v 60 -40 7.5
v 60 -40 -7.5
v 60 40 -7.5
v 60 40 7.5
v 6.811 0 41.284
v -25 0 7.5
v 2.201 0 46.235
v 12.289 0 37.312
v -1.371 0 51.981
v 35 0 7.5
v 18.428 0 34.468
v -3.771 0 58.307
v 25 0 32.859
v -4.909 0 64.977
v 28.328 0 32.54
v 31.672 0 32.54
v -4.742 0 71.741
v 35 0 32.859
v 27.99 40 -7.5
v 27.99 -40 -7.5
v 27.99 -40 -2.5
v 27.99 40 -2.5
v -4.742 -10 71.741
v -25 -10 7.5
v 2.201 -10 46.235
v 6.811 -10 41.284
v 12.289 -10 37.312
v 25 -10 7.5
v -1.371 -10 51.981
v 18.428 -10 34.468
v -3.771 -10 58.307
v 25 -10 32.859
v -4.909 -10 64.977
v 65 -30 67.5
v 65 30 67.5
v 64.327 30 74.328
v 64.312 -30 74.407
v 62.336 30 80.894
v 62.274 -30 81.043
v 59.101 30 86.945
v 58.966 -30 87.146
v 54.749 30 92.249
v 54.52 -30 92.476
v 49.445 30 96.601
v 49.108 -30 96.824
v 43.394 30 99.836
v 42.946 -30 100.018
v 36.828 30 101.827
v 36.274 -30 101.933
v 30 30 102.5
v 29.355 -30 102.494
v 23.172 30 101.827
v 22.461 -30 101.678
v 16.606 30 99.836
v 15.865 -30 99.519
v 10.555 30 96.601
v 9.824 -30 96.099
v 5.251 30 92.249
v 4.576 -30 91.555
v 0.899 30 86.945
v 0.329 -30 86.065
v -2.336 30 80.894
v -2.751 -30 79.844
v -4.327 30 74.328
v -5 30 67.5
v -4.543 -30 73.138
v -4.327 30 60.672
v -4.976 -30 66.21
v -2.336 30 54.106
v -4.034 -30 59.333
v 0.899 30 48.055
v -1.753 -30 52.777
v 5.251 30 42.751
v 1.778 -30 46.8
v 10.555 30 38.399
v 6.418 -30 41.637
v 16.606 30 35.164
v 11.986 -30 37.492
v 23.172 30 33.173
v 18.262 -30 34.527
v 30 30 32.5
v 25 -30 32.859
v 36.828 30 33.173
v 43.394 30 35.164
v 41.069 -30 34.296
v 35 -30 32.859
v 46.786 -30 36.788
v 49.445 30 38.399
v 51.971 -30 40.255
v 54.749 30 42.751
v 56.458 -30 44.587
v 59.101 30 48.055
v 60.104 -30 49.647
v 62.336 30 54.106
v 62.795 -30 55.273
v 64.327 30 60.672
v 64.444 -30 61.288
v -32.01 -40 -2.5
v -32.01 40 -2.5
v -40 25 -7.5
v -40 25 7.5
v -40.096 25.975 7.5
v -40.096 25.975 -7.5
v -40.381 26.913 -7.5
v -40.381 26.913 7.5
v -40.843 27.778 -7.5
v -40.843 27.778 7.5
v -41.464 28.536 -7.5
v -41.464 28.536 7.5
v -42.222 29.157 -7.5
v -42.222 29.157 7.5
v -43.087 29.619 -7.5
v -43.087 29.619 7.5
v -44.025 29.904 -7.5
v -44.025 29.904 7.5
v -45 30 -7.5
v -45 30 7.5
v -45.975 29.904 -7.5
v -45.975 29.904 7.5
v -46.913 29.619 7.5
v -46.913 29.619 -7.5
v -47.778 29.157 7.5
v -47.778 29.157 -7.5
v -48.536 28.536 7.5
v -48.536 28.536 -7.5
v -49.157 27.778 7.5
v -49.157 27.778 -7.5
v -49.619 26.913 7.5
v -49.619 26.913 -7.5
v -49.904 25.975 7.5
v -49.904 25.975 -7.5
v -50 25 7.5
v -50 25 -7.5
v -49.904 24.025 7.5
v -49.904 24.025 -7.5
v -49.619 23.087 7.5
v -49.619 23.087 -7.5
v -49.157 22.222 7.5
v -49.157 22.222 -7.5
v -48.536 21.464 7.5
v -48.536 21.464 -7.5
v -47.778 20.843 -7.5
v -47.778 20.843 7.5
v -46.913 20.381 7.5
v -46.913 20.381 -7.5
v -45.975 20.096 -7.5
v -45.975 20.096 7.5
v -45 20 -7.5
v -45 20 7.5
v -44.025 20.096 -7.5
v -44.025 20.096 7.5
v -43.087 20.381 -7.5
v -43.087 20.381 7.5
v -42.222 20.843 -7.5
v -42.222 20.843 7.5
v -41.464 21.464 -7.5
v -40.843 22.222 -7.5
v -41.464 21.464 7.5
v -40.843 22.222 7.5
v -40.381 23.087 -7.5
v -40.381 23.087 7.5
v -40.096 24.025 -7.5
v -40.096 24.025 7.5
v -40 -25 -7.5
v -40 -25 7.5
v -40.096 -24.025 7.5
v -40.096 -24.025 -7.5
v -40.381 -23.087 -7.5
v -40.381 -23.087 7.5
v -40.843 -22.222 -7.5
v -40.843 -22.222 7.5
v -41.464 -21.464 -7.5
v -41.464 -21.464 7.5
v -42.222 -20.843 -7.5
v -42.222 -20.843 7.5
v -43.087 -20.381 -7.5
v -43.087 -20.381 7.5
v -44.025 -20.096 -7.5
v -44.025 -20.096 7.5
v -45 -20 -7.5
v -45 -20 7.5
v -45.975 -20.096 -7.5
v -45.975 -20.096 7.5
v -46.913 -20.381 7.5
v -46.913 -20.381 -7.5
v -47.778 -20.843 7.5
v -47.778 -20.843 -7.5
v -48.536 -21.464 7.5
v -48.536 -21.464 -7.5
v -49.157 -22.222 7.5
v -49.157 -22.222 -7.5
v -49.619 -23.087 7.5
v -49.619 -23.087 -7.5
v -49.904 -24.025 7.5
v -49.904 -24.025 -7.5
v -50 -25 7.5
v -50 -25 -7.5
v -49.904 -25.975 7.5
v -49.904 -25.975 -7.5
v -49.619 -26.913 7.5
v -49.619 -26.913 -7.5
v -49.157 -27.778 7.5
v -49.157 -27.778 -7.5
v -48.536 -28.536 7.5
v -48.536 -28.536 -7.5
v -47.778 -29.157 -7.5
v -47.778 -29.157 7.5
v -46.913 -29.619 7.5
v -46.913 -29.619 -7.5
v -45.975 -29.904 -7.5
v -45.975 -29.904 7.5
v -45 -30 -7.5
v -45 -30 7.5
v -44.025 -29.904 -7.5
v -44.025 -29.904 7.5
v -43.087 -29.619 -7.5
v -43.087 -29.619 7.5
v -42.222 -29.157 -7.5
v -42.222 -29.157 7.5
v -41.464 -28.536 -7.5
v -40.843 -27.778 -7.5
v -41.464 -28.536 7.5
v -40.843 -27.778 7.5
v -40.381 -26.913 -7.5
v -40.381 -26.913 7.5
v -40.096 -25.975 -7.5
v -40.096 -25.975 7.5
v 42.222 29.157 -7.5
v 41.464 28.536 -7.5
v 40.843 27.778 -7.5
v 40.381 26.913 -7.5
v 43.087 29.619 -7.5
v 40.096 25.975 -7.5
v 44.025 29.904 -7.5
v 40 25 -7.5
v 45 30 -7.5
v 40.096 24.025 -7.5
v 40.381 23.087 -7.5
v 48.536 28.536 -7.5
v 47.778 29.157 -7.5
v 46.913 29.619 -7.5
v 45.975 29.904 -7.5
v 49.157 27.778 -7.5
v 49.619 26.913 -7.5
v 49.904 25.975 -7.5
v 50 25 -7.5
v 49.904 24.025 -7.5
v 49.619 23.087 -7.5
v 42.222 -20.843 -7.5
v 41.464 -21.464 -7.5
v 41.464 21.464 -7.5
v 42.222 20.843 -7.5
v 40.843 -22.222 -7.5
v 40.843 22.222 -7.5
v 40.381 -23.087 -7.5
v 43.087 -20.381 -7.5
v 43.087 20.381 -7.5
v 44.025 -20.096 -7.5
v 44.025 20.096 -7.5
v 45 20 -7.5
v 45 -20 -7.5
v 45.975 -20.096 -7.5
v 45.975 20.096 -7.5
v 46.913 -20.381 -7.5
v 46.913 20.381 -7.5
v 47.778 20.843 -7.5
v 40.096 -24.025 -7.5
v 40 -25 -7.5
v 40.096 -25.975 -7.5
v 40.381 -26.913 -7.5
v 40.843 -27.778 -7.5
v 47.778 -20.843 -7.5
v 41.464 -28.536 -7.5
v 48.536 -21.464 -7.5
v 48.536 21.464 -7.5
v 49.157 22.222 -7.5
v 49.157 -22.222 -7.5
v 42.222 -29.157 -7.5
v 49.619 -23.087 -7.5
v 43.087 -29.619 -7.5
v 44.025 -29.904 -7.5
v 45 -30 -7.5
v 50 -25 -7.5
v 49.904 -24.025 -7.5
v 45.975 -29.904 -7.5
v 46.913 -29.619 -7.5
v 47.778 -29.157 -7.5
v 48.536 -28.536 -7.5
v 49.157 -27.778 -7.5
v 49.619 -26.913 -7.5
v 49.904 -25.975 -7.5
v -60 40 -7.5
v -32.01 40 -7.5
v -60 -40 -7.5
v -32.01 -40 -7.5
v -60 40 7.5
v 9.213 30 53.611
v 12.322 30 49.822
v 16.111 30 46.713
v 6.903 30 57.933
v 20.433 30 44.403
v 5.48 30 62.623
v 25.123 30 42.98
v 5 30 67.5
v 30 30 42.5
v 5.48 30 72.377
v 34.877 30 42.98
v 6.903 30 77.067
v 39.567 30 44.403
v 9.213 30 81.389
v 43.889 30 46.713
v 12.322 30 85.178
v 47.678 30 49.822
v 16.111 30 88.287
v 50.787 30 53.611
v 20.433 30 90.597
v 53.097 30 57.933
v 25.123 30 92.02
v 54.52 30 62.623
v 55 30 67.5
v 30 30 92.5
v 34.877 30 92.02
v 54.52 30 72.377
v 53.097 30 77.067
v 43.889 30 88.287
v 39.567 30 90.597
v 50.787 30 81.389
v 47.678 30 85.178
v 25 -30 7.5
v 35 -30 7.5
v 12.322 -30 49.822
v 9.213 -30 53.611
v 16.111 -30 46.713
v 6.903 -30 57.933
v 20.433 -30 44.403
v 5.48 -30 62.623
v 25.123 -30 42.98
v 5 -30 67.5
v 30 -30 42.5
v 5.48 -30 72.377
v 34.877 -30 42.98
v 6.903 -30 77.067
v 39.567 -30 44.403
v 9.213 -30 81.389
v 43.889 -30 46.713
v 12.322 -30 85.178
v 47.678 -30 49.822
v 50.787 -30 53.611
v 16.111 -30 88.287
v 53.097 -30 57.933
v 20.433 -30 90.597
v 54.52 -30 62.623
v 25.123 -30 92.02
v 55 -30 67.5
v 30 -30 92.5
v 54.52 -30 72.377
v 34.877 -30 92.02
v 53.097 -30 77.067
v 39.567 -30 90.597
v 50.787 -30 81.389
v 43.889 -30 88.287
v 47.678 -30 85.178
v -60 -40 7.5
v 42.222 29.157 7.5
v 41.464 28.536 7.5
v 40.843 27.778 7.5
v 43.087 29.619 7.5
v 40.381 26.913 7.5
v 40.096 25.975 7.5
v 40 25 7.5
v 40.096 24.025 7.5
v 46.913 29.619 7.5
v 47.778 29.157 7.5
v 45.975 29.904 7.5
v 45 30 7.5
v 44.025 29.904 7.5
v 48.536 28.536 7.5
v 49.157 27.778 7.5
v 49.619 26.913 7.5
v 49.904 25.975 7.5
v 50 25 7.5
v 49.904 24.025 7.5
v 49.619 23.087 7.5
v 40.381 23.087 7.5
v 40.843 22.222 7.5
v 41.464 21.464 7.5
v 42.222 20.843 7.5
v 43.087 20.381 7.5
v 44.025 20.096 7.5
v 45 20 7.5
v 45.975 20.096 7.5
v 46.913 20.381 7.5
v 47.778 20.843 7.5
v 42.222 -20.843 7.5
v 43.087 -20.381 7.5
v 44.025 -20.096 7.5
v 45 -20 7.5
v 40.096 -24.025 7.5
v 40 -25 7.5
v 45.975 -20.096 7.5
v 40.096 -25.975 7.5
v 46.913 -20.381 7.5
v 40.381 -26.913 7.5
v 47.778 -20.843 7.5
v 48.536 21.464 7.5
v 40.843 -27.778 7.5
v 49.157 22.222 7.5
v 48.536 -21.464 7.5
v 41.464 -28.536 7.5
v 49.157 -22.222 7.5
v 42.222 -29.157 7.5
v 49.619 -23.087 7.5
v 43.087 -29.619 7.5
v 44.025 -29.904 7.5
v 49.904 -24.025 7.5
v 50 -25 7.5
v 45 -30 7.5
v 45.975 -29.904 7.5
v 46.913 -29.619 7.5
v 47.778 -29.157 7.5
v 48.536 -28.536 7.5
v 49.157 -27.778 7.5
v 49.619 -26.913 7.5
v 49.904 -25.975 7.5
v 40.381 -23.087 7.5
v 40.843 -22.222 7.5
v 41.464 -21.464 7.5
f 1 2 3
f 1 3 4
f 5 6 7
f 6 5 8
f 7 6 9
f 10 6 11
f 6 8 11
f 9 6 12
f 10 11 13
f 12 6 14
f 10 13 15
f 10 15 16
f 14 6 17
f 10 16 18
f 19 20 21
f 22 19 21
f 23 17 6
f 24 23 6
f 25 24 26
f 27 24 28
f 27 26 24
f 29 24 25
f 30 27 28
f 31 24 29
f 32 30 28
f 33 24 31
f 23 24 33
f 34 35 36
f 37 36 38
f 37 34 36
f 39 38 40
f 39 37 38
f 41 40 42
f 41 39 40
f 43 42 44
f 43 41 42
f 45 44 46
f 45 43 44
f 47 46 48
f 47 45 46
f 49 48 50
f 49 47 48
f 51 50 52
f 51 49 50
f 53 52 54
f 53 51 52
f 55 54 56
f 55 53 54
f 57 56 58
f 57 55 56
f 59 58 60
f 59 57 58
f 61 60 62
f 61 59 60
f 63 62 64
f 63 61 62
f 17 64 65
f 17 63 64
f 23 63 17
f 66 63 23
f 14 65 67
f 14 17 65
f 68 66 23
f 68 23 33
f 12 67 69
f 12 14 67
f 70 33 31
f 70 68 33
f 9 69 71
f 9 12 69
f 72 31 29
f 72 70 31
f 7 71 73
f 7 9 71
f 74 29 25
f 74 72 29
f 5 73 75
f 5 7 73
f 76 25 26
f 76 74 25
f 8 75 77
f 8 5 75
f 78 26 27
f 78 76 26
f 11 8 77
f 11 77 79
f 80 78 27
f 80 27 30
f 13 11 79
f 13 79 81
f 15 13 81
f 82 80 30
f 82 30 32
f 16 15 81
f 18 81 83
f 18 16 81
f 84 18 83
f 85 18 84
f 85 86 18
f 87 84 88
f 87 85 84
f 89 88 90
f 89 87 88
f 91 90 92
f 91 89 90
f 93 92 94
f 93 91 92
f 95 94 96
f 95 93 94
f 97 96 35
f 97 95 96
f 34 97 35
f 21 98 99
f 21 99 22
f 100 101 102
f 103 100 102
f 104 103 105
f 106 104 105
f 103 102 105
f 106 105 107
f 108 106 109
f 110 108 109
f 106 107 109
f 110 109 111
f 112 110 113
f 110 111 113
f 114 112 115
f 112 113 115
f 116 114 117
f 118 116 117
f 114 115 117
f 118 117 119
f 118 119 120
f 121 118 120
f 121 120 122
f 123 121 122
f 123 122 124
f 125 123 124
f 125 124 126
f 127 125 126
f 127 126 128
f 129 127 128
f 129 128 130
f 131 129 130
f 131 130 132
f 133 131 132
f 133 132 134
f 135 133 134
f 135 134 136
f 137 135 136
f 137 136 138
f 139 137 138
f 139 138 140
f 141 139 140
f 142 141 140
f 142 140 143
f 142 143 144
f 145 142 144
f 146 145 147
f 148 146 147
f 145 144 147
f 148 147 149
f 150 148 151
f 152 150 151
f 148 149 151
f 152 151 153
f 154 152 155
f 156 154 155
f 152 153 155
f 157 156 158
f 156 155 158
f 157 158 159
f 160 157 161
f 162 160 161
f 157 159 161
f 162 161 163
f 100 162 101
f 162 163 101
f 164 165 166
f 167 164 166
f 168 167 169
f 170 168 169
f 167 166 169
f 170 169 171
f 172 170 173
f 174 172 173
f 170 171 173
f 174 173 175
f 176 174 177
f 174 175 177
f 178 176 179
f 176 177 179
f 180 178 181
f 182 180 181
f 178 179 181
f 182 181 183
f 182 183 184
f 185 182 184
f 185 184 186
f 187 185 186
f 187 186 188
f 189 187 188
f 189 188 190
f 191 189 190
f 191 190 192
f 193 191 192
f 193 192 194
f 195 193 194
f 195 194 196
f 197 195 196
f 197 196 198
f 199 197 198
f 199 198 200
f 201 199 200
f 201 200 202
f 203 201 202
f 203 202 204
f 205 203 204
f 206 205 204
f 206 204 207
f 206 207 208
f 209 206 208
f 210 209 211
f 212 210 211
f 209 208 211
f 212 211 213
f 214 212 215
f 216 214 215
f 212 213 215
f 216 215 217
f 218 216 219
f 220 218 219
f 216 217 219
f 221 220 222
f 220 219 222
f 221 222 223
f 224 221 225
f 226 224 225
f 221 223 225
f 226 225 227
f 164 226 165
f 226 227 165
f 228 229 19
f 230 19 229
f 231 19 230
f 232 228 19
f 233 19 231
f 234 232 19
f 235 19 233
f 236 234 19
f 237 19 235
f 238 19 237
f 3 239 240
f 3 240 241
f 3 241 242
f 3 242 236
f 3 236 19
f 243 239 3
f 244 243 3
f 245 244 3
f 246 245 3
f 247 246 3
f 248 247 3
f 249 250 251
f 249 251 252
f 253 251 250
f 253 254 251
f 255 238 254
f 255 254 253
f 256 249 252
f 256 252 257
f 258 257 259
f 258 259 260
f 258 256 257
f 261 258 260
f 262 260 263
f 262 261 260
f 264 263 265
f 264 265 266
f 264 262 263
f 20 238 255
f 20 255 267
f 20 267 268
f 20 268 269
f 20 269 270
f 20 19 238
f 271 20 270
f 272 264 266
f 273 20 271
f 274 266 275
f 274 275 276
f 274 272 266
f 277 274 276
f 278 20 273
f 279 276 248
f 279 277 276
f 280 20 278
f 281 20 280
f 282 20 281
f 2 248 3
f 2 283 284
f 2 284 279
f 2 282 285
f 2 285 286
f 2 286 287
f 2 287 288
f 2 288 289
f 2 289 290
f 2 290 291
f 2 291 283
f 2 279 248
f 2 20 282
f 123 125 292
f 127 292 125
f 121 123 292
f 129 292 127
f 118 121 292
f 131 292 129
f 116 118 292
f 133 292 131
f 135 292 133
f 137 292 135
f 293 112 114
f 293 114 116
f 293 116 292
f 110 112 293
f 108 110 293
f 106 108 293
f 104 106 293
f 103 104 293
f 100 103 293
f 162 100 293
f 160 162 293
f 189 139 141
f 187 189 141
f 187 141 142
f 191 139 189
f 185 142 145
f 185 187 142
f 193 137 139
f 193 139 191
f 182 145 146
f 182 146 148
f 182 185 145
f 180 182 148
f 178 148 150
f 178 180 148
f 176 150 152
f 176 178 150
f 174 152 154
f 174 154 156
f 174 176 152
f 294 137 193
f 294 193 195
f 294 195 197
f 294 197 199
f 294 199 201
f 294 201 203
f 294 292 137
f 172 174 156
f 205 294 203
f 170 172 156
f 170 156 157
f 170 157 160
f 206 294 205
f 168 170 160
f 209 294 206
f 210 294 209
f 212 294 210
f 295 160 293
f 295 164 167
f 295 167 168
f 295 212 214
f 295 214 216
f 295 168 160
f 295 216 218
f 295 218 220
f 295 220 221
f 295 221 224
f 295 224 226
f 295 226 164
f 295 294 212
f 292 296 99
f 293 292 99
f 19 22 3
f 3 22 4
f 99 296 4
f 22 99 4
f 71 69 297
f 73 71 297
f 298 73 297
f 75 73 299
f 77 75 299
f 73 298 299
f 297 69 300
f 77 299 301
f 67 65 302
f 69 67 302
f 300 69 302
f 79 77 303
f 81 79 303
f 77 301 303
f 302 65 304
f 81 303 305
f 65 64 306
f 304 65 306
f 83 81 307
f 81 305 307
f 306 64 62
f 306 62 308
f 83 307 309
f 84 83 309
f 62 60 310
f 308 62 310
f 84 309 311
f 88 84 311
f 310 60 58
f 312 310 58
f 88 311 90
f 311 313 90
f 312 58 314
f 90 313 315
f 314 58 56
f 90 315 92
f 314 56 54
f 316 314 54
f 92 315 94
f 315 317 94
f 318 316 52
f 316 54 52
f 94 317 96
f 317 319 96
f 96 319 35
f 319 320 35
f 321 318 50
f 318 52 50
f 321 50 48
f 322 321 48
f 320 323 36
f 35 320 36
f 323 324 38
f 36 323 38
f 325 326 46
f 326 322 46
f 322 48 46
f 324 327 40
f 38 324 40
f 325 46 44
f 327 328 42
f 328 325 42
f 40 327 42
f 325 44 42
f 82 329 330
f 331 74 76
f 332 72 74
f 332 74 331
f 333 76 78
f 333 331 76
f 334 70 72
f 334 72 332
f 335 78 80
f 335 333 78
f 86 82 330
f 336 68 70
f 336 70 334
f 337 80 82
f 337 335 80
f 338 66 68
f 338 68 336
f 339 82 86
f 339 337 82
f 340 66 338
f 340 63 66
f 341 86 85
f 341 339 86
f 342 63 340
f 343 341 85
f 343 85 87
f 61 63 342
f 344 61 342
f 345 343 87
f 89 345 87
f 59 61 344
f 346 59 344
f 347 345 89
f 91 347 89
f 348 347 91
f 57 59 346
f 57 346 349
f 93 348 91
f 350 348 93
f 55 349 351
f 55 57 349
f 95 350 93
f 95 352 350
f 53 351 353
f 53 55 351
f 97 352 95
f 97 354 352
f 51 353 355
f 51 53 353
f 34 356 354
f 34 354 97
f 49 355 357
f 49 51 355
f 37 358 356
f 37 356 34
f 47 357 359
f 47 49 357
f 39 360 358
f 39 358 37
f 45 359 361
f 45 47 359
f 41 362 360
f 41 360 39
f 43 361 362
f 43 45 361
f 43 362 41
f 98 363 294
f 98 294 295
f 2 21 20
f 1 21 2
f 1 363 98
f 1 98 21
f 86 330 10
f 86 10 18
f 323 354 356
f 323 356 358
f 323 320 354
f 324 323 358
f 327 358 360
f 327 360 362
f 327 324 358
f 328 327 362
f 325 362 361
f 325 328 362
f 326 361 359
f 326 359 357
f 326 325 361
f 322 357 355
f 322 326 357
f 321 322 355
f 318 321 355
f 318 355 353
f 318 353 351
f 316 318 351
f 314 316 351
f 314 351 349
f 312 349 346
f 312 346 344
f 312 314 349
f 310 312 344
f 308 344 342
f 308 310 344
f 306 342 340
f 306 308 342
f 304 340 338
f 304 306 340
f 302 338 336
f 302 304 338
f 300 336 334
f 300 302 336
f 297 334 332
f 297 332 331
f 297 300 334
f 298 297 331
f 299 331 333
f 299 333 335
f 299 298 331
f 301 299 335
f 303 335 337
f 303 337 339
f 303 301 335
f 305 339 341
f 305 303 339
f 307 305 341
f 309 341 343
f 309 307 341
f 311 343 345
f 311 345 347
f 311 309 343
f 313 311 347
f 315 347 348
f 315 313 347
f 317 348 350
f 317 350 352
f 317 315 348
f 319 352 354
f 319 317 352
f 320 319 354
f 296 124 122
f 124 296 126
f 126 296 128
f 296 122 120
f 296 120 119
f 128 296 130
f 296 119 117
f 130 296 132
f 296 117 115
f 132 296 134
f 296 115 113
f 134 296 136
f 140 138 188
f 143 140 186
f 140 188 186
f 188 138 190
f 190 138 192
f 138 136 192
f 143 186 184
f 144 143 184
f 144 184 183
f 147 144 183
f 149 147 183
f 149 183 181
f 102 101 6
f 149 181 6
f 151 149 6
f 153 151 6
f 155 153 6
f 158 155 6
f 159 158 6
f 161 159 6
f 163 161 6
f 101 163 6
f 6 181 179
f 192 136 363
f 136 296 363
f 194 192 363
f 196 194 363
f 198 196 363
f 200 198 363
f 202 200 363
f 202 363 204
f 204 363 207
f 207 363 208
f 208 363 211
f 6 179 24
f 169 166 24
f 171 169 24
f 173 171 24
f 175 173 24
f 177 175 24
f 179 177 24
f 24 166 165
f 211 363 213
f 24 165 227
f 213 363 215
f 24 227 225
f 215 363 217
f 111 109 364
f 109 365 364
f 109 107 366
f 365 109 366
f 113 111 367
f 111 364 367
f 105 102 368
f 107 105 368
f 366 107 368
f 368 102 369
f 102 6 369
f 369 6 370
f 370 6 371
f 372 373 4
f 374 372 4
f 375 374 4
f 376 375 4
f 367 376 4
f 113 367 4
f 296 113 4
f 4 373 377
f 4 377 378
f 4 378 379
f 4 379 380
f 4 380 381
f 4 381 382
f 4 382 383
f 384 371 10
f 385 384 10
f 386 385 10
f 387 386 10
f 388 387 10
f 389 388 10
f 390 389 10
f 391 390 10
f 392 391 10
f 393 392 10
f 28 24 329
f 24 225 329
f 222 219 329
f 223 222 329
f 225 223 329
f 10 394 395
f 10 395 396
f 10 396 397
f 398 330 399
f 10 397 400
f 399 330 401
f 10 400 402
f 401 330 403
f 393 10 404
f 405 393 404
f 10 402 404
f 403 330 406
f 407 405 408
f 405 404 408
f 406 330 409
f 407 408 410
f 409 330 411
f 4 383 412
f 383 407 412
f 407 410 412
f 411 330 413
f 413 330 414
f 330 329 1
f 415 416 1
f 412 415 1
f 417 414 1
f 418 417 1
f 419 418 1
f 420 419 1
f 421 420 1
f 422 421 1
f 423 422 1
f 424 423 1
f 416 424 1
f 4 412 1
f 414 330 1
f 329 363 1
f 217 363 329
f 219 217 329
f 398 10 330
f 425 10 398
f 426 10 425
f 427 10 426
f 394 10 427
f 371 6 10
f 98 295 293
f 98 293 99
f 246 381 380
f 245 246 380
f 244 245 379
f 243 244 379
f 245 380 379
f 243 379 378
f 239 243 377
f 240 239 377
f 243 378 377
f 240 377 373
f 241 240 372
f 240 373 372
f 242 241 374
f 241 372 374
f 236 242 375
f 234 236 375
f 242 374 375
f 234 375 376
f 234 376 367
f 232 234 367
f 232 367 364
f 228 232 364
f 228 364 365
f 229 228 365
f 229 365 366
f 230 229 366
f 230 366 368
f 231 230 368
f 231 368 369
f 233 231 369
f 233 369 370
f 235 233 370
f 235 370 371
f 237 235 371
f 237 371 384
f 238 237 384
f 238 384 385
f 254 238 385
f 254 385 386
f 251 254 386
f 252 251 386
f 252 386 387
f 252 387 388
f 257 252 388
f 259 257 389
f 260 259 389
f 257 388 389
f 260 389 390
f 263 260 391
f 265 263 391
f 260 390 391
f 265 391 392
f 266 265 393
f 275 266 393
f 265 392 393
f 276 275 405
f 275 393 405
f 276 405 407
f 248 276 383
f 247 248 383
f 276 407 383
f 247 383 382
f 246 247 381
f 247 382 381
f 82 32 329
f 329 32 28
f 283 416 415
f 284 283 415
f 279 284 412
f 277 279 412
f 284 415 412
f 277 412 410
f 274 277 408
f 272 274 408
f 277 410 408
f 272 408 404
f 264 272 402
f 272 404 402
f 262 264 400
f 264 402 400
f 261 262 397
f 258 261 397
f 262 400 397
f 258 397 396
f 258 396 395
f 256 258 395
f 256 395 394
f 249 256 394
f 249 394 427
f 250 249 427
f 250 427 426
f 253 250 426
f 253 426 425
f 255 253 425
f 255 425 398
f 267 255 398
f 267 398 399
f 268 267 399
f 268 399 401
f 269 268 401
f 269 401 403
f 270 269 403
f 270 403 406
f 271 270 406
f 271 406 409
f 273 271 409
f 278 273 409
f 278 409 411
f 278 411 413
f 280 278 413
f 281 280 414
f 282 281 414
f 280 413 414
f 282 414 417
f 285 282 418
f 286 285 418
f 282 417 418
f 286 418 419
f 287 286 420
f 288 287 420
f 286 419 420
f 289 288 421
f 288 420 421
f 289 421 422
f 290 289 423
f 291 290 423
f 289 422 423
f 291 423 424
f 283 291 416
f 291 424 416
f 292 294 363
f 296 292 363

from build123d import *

# Parameters (mm, degrees)
F0_W      = 120
F0_H      = 15
F1_DEPTH  = 40
F2_W      = 60
F2_H      = 5
F3_DEPTH  = 80.001
F4_R      = 5
F5_DEPTH  = 15.001
F6_R      = 35
F6_R_2    = 25
F7_DEPTH  = 30
F9_DEPTH  = 30
F11_DEPTH = 10


with BuildPart() as f1:
    # F0 (on Front) → F1 (new body, symmetric)
    with BuildSketch(Plane.XZ):
        Rectangle(F0_W, F0_H)
    extrude(amount=F1_DEPTH, both=True)

    # F2 (on face) → F3 (cut, through all)
    with BuildSketch(Plane.XZ.offset(40)):
        with Locations((-2.0098921657, -5)):
            Rectangle(F2_W, F2_H)
    extrude(amount=-F3_DEPTH, mode=Mode.SUBTRACT)

    # F4 (on face) → F5 (cut, through all)
    with BuildSketch(Plane.XY.offset(7.5)):
        with Locations((-45, 25)):
            Circle(F4_R)
        with Locations((-45, -25)):
            Circle(F4_R)
        with Locations((45, -25)):
            Circle(F4_R)
        with Locations((45, 25)):
            Circle(F4_R)
    extrude(amount=-F5_DEPTH, mode=Mode.SUBTRACT)



with BuildPart() as f7:
    # F6 (on Front) → F7 (new body, symmetric)
    with BuildSketch(Plane.XZ):
        with Locations((30, 67.5)):
            Circle(F6_R)
        with Locations((30, 67.5)):
            Circle(F6_R_2, mode=Mode.SUBTRACT)
    extrude(amount=F7_DEPTH, both=True)


with BuildPart() as f1_1:
    add(f1.part)

    add(f7.part)  # F9 merges F7
    # F8 (on Front) → F9 (join)
    with BuildSketch(Plane.XZ):
        with BuildLine():
            ThreePointArc((35, 32.8589838486), (30, 32.5), (25, 32.8589838486))
            Line((25, 32.8589838486), (25, 7.5))
            Line((25, 7.5), (35, 7.5))
            Line((35, 7.5), (35, 32.8589838486))
        make_face()
    extrude(amount=F9_DEPTH)

    # F10 (on Front) → F11 (join)
    with BuildSketch(Plane.XZ):
        with BuildLine():
            ThreePointArc((25, 32.8589838486), (2.2005780667, 46.2351900979), (-4.7421322486, 71.740783751))
            Line((-4.7421322486, 71.740783751), (-25, 7.5))
            Line((-25, 7.5), (25, 7.5))
            Line((25, 7.5), (25, 32.8589838486))
        make_face()
    extrude(amount=F11_DEPTH)


solid = f1_1.part
